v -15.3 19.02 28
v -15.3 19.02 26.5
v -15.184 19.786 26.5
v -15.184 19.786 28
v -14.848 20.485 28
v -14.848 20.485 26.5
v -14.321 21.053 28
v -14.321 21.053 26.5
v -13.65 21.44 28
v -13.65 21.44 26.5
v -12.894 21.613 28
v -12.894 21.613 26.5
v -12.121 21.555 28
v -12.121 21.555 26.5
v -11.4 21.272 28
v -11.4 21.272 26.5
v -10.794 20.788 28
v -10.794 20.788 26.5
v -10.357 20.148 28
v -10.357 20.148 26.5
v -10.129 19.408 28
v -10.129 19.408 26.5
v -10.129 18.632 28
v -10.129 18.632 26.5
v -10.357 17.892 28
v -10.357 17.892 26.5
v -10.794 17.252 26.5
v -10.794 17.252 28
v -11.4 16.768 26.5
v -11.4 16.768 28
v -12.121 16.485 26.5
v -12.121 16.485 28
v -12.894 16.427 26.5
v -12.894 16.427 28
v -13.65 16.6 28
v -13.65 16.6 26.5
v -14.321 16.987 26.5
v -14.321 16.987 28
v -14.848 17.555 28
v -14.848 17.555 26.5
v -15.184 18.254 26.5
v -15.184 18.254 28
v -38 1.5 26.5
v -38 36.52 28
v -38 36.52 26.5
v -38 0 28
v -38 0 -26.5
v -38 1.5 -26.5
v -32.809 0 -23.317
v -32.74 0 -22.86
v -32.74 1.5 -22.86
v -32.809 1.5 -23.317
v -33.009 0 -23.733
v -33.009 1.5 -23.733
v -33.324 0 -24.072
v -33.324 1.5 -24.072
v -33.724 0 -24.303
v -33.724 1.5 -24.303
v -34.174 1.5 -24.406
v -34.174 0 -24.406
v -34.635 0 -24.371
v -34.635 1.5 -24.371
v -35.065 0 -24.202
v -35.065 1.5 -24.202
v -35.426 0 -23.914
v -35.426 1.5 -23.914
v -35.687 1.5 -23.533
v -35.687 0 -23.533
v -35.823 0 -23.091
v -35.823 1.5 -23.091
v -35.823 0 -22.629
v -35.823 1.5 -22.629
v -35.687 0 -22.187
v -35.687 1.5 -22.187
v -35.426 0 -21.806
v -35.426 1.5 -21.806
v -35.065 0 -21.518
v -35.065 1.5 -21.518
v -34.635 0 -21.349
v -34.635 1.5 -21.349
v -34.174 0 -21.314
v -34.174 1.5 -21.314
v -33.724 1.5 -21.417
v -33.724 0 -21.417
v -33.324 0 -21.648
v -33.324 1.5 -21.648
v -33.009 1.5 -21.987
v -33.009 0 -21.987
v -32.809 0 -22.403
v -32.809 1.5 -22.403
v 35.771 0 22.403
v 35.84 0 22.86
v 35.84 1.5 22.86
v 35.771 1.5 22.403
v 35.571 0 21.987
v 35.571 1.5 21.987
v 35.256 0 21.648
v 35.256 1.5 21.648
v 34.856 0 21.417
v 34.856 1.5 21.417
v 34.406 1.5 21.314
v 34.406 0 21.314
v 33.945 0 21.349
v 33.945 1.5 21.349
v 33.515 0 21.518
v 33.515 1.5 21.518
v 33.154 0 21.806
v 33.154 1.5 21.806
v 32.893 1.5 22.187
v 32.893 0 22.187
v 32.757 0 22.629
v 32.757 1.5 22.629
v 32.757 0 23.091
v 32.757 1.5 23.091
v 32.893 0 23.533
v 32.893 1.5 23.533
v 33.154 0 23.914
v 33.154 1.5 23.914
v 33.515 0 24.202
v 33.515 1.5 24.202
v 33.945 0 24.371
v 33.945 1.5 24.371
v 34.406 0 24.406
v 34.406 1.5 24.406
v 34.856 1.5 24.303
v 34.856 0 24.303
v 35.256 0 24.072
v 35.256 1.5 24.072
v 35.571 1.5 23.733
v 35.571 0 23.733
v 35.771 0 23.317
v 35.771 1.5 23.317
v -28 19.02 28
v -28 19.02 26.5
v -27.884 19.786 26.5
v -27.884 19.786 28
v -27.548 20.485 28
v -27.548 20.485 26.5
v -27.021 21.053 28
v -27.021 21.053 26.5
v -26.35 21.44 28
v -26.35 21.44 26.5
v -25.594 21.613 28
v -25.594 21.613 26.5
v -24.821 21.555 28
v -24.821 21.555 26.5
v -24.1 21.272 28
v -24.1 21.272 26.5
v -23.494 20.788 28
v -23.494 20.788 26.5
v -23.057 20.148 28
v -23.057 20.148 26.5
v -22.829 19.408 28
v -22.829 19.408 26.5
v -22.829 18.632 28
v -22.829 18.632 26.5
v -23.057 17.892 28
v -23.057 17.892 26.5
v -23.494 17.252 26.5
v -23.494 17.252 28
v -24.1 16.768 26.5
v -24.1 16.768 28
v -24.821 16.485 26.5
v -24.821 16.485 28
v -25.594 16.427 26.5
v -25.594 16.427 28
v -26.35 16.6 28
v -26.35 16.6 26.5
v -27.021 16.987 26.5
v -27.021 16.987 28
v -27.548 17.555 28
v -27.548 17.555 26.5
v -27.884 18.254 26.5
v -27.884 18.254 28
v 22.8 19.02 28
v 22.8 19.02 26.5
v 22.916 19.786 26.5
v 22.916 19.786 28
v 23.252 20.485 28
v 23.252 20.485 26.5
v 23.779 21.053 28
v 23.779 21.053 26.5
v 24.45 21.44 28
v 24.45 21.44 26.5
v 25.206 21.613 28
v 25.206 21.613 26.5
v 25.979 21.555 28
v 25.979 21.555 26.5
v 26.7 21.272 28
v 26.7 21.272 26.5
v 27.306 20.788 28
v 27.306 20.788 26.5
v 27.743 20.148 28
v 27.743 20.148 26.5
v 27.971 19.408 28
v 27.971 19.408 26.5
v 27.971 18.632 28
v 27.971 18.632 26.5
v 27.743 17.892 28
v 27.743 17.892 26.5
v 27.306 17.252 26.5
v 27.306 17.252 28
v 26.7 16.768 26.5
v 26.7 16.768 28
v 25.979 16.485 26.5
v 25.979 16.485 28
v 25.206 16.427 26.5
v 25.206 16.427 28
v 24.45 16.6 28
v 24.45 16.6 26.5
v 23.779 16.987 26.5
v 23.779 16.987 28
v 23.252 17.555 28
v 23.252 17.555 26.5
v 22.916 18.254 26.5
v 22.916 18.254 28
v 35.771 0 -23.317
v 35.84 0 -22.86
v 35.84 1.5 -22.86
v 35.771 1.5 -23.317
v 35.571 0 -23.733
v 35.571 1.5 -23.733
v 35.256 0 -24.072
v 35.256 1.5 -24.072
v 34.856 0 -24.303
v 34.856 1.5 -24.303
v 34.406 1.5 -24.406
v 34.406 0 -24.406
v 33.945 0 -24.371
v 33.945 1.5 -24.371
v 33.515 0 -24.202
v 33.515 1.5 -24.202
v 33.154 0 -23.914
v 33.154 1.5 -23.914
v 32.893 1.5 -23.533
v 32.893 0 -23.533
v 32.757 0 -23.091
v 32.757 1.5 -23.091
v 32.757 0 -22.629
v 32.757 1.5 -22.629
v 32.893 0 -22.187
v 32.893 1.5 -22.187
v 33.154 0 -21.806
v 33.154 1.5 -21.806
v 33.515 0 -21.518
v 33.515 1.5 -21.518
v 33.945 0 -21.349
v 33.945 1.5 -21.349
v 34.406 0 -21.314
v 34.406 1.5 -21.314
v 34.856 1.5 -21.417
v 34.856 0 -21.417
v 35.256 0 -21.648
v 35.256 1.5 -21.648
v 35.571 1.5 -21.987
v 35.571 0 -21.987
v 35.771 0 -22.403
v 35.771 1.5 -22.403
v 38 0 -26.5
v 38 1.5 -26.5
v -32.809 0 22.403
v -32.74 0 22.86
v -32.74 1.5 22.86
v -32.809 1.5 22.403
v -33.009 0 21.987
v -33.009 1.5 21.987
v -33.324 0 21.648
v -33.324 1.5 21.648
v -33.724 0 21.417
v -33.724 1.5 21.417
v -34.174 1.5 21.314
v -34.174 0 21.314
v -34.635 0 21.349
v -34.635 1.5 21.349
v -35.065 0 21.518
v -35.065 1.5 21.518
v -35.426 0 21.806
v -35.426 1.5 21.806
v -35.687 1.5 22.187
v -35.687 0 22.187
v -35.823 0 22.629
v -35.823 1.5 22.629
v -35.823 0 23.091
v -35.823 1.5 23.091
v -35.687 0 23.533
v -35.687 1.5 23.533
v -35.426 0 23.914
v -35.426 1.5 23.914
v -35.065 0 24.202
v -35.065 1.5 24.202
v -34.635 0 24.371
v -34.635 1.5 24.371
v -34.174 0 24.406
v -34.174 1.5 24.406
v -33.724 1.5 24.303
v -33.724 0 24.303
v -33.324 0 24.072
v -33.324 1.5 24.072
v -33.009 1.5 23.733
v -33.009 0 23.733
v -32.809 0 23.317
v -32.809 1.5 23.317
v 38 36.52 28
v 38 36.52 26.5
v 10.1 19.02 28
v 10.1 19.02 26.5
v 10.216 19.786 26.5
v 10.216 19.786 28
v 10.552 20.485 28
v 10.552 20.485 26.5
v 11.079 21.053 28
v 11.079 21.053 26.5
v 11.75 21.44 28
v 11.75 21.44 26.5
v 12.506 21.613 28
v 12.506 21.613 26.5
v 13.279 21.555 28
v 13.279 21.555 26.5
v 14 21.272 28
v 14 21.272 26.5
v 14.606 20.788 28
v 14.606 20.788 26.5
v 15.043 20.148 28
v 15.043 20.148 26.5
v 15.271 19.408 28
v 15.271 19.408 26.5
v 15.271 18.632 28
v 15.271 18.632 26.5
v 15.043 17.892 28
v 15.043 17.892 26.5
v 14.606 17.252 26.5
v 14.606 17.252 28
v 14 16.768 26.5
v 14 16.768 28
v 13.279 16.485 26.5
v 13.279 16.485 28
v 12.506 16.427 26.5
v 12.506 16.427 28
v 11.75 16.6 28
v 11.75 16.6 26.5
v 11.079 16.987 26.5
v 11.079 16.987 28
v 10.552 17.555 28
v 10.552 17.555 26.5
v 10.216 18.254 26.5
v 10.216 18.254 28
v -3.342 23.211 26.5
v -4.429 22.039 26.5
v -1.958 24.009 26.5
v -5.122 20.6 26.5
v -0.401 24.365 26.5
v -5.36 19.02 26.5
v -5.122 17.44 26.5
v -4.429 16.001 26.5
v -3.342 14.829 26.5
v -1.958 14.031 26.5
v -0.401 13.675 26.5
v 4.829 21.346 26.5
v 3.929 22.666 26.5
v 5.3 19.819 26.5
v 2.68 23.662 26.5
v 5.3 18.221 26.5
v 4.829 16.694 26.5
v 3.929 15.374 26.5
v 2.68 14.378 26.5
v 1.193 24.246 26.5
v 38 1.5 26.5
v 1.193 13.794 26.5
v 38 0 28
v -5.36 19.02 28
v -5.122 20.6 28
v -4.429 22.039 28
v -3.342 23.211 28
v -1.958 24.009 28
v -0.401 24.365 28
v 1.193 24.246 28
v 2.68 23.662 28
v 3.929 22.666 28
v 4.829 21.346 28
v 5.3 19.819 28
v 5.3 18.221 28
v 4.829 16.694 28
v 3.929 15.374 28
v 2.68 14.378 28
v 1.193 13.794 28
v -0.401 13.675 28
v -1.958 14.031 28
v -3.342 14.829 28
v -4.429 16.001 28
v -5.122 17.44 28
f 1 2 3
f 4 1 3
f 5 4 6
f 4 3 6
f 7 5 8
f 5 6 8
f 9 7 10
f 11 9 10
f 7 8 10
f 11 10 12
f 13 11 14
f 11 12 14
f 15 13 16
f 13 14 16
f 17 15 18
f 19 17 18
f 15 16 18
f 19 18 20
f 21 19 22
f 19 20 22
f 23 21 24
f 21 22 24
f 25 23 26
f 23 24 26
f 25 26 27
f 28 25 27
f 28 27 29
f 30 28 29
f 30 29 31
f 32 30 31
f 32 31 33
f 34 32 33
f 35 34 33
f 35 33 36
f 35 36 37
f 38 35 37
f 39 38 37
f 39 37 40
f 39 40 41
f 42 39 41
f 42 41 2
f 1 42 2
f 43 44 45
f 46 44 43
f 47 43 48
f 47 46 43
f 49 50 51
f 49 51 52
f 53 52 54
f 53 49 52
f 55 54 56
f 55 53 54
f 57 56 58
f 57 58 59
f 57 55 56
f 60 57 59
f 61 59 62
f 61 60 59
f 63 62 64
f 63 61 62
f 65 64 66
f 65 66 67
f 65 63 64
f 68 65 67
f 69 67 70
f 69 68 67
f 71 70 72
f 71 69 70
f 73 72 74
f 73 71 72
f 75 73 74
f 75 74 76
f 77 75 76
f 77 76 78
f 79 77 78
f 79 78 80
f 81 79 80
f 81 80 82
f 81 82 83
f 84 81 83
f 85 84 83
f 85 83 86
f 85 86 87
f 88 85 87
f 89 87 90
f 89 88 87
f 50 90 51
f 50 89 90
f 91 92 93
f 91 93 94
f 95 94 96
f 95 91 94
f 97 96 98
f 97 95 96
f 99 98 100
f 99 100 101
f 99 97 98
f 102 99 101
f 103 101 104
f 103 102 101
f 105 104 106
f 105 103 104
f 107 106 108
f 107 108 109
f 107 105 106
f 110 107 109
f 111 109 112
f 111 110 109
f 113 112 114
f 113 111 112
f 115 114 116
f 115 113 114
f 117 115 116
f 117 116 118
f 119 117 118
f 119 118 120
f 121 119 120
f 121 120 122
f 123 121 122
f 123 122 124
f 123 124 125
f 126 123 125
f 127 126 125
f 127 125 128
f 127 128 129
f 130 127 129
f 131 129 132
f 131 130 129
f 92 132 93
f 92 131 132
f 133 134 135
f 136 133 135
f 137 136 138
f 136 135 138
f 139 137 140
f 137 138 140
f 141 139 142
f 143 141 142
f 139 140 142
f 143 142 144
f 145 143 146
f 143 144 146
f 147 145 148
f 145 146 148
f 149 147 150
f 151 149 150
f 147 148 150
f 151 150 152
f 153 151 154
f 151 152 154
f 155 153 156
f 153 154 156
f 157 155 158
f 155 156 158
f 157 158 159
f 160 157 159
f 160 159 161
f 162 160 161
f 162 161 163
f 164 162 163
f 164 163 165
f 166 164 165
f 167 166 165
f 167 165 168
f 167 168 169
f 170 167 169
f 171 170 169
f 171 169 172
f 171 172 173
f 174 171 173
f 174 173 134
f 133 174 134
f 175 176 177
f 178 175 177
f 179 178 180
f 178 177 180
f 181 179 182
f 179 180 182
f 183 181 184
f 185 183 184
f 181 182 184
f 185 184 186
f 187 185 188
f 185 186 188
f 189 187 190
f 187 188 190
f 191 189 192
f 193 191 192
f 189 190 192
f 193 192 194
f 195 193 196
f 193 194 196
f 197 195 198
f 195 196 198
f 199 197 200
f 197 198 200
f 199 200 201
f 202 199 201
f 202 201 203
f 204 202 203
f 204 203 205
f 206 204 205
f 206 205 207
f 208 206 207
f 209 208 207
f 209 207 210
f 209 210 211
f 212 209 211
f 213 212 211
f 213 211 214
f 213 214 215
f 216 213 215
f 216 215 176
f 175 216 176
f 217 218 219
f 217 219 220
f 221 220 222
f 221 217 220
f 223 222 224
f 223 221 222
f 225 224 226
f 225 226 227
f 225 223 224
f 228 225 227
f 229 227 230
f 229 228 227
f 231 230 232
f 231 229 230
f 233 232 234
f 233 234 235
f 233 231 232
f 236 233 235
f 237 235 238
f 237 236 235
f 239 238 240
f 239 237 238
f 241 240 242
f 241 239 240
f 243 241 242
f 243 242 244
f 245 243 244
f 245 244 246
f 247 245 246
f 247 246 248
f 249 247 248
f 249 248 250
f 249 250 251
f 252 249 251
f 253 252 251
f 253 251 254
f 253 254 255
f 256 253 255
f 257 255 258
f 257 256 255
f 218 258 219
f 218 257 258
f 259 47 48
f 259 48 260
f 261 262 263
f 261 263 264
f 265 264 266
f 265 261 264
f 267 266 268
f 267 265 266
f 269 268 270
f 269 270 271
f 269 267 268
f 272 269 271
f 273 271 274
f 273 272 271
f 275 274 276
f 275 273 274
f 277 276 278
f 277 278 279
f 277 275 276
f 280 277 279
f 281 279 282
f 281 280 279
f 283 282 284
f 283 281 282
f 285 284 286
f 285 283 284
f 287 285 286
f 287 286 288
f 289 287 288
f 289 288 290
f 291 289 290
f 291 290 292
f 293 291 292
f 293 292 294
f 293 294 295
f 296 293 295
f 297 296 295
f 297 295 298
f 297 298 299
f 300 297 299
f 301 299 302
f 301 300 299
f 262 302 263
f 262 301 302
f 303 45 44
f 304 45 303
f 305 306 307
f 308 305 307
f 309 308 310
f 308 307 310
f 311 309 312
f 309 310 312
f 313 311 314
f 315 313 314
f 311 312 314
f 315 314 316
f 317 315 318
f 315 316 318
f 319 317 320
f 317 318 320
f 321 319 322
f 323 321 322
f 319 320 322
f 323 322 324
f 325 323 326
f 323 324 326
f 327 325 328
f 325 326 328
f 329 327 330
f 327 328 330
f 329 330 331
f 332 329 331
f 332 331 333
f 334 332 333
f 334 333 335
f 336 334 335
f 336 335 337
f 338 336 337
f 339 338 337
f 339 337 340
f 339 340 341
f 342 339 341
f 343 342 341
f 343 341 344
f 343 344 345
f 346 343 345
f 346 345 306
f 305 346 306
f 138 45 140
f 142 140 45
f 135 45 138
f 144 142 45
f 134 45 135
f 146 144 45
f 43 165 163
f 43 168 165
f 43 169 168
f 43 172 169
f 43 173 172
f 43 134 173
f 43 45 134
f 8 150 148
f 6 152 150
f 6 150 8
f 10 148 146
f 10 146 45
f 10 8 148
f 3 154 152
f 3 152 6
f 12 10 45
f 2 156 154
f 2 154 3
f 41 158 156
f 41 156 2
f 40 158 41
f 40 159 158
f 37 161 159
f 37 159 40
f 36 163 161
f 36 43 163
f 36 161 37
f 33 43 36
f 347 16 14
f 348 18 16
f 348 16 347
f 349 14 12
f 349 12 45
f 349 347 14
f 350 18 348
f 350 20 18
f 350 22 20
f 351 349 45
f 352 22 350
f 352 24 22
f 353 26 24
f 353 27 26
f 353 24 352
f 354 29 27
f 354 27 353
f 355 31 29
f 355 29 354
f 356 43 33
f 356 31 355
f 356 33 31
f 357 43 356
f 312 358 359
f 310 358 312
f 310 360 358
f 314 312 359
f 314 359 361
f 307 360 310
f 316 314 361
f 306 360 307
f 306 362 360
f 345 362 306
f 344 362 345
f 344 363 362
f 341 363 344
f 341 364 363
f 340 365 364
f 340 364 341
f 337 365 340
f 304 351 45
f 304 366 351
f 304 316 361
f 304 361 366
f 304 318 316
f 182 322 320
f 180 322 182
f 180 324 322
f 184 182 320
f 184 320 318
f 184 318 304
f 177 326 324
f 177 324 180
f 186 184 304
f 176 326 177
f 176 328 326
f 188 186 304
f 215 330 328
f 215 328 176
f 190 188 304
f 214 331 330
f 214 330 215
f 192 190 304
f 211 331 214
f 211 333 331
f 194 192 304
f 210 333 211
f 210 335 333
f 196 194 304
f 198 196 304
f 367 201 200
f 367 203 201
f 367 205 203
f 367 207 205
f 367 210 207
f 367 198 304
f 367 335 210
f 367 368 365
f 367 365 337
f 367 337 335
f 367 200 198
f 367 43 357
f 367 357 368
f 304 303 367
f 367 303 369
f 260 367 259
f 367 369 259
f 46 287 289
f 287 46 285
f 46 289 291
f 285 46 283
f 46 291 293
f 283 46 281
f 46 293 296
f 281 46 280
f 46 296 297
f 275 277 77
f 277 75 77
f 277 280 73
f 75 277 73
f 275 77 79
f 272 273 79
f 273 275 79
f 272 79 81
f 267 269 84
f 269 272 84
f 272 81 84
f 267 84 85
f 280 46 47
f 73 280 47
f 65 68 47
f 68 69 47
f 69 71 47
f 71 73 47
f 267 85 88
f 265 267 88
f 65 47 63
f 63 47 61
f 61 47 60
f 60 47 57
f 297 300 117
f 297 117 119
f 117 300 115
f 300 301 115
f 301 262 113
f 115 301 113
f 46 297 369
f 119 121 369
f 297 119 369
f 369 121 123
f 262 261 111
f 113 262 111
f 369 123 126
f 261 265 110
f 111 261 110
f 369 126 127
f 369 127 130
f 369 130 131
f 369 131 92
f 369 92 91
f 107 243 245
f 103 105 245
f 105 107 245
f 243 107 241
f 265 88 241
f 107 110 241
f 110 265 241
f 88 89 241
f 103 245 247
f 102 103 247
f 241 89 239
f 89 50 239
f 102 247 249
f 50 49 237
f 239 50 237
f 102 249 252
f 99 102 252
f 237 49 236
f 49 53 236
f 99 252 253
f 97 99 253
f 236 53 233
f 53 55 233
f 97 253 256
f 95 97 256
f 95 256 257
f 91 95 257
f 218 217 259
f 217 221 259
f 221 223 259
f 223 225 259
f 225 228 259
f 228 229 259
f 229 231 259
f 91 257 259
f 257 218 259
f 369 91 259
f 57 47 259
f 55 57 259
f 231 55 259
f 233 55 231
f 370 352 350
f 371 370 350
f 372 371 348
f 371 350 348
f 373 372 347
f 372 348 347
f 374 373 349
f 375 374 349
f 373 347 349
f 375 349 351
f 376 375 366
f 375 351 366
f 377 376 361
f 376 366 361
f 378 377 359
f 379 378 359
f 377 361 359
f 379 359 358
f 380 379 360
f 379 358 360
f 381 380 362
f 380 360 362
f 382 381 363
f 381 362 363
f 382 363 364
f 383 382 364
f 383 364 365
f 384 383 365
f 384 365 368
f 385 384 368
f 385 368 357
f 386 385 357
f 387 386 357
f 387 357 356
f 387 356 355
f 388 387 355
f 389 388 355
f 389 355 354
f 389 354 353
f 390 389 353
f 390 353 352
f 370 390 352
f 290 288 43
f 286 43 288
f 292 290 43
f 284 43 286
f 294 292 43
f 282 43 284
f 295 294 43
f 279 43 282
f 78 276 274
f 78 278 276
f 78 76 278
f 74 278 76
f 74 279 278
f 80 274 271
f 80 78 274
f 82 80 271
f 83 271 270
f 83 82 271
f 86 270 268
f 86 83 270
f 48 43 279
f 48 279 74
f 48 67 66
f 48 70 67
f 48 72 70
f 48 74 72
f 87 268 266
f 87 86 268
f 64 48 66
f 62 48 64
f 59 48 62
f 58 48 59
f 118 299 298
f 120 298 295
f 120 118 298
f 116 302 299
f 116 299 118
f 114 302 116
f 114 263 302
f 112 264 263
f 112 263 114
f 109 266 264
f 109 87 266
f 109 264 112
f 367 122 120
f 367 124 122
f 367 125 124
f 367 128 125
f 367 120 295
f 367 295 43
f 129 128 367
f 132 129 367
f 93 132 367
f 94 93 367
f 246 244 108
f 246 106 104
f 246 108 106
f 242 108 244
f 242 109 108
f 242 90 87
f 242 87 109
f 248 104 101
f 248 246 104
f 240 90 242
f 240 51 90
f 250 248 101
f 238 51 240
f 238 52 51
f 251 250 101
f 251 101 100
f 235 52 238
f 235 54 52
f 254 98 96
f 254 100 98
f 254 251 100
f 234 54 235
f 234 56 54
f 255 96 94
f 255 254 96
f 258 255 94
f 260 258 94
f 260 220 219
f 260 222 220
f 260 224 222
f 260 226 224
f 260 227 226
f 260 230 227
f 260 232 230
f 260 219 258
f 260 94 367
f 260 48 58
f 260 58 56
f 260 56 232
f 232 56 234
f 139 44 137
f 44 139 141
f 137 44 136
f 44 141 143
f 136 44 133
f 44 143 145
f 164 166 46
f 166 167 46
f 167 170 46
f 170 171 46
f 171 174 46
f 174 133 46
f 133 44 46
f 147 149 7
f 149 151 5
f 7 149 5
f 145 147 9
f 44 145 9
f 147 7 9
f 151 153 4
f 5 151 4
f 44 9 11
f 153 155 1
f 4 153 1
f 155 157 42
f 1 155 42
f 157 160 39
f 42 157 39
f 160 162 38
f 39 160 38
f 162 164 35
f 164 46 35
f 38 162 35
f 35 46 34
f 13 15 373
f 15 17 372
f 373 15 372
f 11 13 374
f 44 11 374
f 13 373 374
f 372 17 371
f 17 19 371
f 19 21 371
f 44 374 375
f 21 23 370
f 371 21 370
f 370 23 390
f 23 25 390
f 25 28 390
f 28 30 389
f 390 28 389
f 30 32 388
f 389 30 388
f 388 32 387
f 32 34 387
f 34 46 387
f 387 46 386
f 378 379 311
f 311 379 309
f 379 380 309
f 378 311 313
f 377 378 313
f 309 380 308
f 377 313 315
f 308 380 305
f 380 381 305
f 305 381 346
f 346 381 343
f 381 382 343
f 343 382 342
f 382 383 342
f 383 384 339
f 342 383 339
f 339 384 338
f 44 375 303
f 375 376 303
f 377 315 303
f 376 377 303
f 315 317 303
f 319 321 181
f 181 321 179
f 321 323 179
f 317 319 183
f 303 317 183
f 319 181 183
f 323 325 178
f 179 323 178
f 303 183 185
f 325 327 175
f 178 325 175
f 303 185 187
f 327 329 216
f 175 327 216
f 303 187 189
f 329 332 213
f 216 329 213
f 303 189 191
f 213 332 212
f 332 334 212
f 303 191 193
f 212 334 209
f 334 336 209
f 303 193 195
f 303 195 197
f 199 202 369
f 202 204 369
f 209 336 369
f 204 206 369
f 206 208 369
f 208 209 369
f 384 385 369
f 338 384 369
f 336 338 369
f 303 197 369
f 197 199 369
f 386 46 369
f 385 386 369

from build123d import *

# Parameters (mm, degrees)
SKETCH_1_W          = 76
SKETCH_1_H          = 53
SKETCH_1_R          = 1.55
EXTRUDE_1_DEPTH     = 1.5
SKETCH_2_W          = 76
SKETCH_2_H          = 1.5
EXTRUDE_2_DEPTH     = 1.5
SKETCH_3_W          = 76
SKETCH_3_H          = 1.5
EXTRUDE_3_DEPTH     = 35.02
SKETCH_4_R          = 5.36
SKETCH_4_R_2        = 2.600000007
CUT_EXTRUDE_1_DEPTH = 60


with BuildPart() as part:
    # 草图1 → 凸台-拉伸1 (new body)
    with BuildSketch(Plane(origin=(0, 0, 0), x_dir=(1, 0, 0), z_dir=(0, 1, 0))):
        Rectangle(SKETCH_1_W, SKETCH_1_H)
        with Locations((-34.29, 22.86)):
            Circle(SKETCH_1_R, mode=Mode.SUBTRACT)
        with Locations((-34.29, -22.86)):
            Circle(SKETCH_1_R, mode=Mode.SUBTRACT)
        with Locations((34.29, -22.86)):
            Circle(SKETCH_1_R, mode=Mode.SUBTRACT)
        with Locations((34.29, 22.86)):
            Circle(SKETCH_1_R, mode=Mode.SUBTRACT)
    extrude(amount=EXTRUDE_1_DEPTH)

    # 草图2 → 凸台-拉伸2 (add)
    with BuildSketch(Plane.XY.offset(26.5)):
        with Locations((0, 0.75)):
            Rectangle(SKETCH_2_W, SKETCH_2_H)
    extrude(amount=EXTRUDE_2_DEPTH)

    # 草图3 → 凸台-拉伸3 (add)
    with BuildSketch(Plane(origin=(0, 1.5, 0), x_dir=(1, 0, 0), z_dir=(0, 1, 0))):
        with Locations((0, -27.25)):
            Rectangle(SKETCH_3_W, SKETCH_3_H)
    extrude(amount=EXTRUDE_3_DEPTH)

    # 草图4 → 切除-拉伸1 (cut)
    with BuildSketch(Plane(origin=(0, 0, 26.5), x_dir=(-1, 0, 0), z_dir=(0, 0, -1))):
        with Locations((0, 19.02)):
            Circle(SKETCH_4_R)
        with Locations((-12.7, 19.02)):
            Circle(SKETCH_4_R_2)
        with Locations((-25.4, 19.02)):
            Circle(SKETCH_4_R_2)
        with Locations((12.7, 19.02)):
            Circle(SKETCH_4_R_2)
        with Locations((25.4, 19.02)):
            Circle(SKETCH_4_R_2)
    extrude(amount=-CUT_EXTRUDE_1_DEPTH, mode=Mode.SUBTRACT)


solid = part.part
